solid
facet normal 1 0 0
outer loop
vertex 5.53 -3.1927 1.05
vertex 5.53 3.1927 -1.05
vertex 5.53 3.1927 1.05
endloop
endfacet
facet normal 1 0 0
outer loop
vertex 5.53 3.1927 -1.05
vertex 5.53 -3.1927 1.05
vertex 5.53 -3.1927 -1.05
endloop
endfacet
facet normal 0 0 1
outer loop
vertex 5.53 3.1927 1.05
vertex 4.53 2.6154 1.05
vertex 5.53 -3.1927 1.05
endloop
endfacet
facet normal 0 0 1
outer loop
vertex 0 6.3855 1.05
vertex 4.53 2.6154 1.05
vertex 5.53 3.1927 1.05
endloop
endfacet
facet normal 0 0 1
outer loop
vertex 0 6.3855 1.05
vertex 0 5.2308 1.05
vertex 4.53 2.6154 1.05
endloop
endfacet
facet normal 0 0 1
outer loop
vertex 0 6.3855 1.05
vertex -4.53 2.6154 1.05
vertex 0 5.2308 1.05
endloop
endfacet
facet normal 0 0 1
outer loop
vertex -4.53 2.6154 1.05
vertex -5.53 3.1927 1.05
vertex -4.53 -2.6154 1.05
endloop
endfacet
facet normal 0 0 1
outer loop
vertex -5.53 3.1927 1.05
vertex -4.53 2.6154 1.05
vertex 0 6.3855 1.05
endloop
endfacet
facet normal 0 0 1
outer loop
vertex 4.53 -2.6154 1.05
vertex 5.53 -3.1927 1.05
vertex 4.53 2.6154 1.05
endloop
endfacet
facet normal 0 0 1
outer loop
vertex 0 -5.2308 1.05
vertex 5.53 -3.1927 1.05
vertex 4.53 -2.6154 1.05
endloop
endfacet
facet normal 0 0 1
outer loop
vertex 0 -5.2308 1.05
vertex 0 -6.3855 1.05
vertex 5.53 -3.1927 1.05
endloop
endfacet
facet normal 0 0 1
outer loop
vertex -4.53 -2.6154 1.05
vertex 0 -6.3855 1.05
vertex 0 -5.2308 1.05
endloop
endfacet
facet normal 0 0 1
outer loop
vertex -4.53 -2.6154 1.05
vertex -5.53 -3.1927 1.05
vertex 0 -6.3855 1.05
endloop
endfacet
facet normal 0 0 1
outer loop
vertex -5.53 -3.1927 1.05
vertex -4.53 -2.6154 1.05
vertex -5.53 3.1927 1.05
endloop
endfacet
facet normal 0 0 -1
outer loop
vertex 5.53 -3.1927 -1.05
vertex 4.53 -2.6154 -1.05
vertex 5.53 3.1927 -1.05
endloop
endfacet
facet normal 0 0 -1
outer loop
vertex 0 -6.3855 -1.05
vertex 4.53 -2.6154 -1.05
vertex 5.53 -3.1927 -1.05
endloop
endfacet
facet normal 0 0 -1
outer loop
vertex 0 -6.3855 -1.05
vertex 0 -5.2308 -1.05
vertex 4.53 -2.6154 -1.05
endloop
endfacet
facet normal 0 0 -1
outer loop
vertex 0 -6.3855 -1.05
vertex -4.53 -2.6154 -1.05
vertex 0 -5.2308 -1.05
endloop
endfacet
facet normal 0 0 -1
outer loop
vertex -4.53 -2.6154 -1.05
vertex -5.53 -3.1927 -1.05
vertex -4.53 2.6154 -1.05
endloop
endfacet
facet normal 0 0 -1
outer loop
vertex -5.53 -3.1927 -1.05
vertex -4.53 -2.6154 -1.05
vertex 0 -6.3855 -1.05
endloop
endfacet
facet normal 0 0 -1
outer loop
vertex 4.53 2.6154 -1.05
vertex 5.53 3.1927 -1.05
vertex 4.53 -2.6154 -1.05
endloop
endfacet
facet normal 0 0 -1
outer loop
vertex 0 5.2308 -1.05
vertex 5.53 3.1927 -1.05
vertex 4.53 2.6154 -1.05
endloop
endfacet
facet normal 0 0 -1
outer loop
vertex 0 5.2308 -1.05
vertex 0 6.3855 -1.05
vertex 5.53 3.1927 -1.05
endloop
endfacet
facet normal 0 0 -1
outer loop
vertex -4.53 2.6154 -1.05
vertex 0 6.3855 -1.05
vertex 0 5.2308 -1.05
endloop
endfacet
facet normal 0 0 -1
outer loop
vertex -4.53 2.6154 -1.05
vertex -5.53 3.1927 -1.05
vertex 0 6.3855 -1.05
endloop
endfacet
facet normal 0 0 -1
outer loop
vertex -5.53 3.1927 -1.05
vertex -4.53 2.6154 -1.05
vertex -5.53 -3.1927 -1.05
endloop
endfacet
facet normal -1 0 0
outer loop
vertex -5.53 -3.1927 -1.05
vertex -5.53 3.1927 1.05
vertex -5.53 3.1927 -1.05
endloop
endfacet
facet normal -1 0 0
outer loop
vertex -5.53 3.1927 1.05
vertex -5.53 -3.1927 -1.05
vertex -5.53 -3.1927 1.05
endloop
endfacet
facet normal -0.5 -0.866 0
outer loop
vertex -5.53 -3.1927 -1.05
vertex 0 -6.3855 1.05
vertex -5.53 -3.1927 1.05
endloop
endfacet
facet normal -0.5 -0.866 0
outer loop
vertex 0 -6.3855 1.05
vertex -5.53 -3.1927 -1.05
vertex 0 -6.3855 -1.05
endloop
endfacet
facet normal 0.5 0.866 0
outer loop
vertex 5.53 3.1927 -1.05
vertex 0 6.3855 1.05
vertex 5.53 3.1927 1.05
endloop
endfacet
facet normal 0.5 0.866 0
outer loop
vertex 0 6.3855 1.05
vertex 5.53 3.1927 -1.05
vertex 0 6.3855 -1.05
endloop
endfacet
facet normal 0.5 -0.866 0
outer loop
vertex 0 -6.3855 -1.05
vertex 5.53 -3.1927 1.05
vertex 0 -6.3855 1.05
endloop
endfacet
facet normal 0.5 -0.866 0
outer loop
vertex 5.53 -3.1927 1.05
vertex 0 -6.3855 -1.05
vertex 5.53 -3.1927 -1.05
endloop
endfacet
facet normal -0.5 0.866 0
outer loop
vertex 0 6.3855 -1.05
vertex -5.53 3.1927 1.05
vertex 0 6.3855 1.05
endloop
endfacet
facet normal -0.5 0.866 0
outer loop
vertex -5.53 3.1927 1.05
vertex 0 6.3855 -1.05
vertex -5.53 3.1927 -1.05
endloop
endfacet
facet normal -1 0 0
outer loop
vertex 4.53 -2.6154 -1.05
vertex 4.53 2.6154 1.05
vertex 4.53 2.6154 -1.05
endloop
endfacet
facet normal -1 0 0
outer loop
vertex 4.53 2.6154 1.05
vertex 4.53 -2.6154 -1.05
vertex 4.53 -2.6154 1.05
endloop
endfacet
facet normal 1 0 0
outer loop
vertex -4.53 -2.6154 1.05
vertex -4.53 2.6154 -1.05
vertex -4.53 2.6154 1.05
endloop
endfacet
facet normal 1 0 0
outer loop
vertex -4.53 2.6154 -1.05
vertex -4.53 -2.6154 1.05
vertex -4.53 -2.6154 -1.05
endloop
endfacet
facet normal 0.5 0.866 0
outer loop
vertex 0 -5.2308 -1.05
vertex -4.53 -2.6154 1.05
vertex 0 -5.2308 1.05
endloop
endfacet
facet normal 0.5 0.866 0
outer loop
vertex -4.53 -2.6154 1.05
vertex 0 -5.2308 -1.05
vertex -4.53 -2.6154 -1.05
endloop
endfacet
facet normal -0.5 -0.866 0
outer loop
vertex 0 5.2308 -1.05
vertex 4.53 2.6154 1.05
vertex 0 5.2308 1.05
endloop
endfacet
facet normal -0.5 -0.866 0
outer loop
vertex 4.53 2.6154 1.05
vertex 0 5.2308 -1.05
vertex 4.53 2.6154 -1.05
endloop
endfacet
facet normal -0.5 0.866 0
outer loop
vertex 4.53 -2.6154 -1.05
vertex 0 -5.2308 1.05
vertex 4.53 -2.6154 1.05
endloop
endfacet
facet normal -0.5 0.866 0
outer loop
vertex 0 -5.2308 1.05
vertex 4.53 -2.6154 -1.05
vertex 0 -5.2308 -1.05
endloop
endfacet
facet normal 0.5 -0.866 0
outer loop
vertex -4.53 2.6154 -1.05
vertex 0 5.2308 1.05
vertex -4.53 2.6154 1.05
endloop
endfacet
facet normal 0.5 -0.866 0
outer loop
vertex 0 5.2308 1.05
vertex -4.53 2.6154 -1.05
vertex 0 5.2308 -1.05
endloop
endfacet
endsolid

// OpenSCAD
// file: ../../lib/bolt/metric_bolt.scad
include <bolt.scad>;

// https://www.fairburyfastener.com/xdims_metric_nuts.htm

//  hex_nut (height, thread_d, size, tolerance, quality, thread, pitch);
//hex_nut (1/8, 1/4, 3/8, 1/128, 32, 1, "imperial", 28);

/*
    hex_nut (height, thread_d, size, tolerance, quality, bool_cut, thread, pitch);
        height      =   height of the nut
        thread_d    =   threaded hole diameter width
        size        =   [ 0.00, 0.00, 0.00 ]hexagonal nut size
        tolerance   =   tolerance of entire measures (always positive, addition and subtraction already
                        calculated within the script
        quality     =   overall quality of the returned function (ref. $fn)
        bool_cut    =   do (1) or not (0) the nut cut
        *thread     =   string variable declaring measure type -> "metric" or "imperial"
        *pitch      =   stands for thread pitch      
*/

module m2_hex_nut() {
  hex_nut(1.6, 2, 4.32, 0.01, 32, 1, "metric", 0.4);
}

module m2_5_hex_nut() {
  hex_nut(2, 2.5, 5.45, 0.01, 32, 1, "metric", 0.45);
}

module m3_hex_nut() {
  hex_nut(2.3, 3, 6.01, 0.01, 32, 1, "metric", 0.5);
}

module m4_hex_nut() {
  hex_nut(3.2, 4, 7.66, 0.01, 32, 1, "metric", 0.7);
}

module m5_hex_nut() {
  hex_nut(4.7, 5, 8.79, 0.01, 32, 1, "metric", 0.8);
}

module m6_hex_nut() {
  hex_nut(5.2, 6, 11.05, 0.01, 32, 1, "metric", 1);
}

module m8_hex_nut() {
  hex_nut(6.8, 8, 14.38, 0.01, 32, 1, "metric", 1.25);
}

module m10_hex_nut() {
  hex_nut(8.4, 10, 17.77, 0.01, 32, 1, "metric", 1.5);
}

//  hex_bolt (lenght, thread_d, head_h, head_d, tolerance, quality, thread, pitch);

/*
    hex_bolt (lenght, thread_d, head_h, head_d, tolerance, quality, bool_cut, thread, pitch);
        lenght      =   threaded bar lenght
        thread_d    =   threaded bar diameter width
        head_h      =   hexagonal bolt head height
        head_d      =   hexagonal bolt head size
        tolerance   =   tolerance of entire measures (always positive, addition and subtraction already
                        calculated within the script
        quality     =   overall quality of the returned function (ref. $fn)
        bool_cut    =   do (1) or not (0) the nut cut
        *thread     =   string variable declaring measure type -> "metric" or "imperial"
        *pitch      =   stands for thread pitch
*/

module m2_hex_bolt(lenght=26,head_h=2) {
  translate([0, 0, -lenght])
    hex_bolt(lenght, 2, head_h, 4.32, 0.1, 32, 1, "metric", 0.4);
}

module m2_5_hex_bolt(lenght=26,head_h=2) {
  translate([0, 0, -lenght])
    hex_bolt(lenght, 2.5, head_h, 5.45, 0.1, 32, 1, "metric", 0.45);
}

module m3_hex_bolt(lenght=26,head_h=2) {
  translate([0, 0, -lenght])
    hex_bolt(lenght, 3, head_h, 6.01, 0.1, 32, 1, "metric", 0.5);
}

module m4_hex_bolt(lenght=26,head_h=2) {
  translate([0, 0, -lenght])
    hex_bolt(lenght, 4, head_h, 7.66, 0.1, 32, 1, "metric", 0.7);
}

module m5_hex_bolt(lenght=26,head_h=2) {
  translate([0, 0, -lenght])
    hex_bolt(lenght, 5, head_h, 8.79, 0.1, 32, 1, "metric", 0.8);
}

module m6_hex_bolt(lenght=26,head_h=2) {
  translate([0, 0, -lenght])
    hex_bolt(lenght, 6, head_h, 11.05, 0.1, 32, 1, "metric", 1);
}

module m8_hex_bolt(lenght=26,head_h=6.8) {
  translate([0, 0, -lenght])
    hex_bolt(lenght, 8, head_h, 14.38, 0.1, 32, 1, "metric", 1.25);
}

module m10_hex_bolt(lenght=26,head_h=8.4) {
  translate([0, 0, -lenght])
    hex_bolt(lenght, 10, head_h, 17.77, 0.1, 32, 1, "metric", 1.5);
}

//m8_hex_bolt_extrude(20, 1, 0.1);

module m1_6_hex_bolt_extrude(depth, head, clear) {
  translate([0,0,-depth/2]) hex_bolt_extrude(depth, head, 1.6, 3.41, clear);
}

module m2_hex_bolt_extrude(depth, head, clear) {
  translate([0,0,-depth/2]) hex_bolt_extrude(depth, head, 2, 4.32, clear);
}

module m2_5_hex_bolt_extrude(depth, head, clear) {
  translate([0,0,-depth/2]) hex_bolt_extrude(depth, head, 2.5, 5.45, clear);
}

module m3_hex_bolt_extrude(depth, head, clear) {
  translate([0,0,-depth/2]) hex_bolt_extrude(depth, head, 3, 6.01, clear);
}

module m4_hex_bolt_extrude(depth, head, clear) {
  translate([0,0,-depth/2]) hex_bolt_extrude(depth, head, 4, 7.66, clear);
}

module m5_hex_bolt_extrude(depth, head, clear) {
  translate([0,0,-depth/2]) hex_bolt_extrude(depth, head, 5, 8.79, clear);
}

module m6_hex_bolt_extrude(depth, head, clear) {
  translate([0,0,-depth/2]) hex_bolt_extrude(depth, head, 6, 11.05, clear);
}

module m8_hex_bolt_extrude(depth, head, clear) {
  translate([0,0,-depth/2]) hex_bolt_extrude(depth, head, 8, 14.38, clear);
}

module m10_hex_bolt_extrude(depth, head, clear) {
  translate([0,0,-depth/2]) hex_bolt_extrude(depth, head, 10, 17.77, clear);
}

module hex_bolt_extrude(depth, head_h, body, head, clear) {
  translate([0,0,head_h/2]) rotate([0, 0, 90]) hex_head_extrude(head_h, head, clear);
  translate([0,0,head_h]) bolt_body_extrude(depth-head_h+clear, body, clear);
}

module bolt_body_extrude(height, diameter, clear) {
    radius = diameter/2+clear*2;
    cylinder(h=height, r1=radius, r2=radius, center=false, $fn=50);
}

module hex_head_extrude(height, diameter, clear) {
    height = height+clear;
	radius = diameter+1+clear*4;
    angle = 360/6;
	cote = (radius)/tan(angle);

	union() {
		rotate([0,0,0])
			cube([radius,cote,height],center=true);
		rotate([0,0,angle])
			cube([radius,cote,height],center=true);
		rotate([0,0,2*angle])
			cube([radius,cote,height],center=true);
	}
}
// file: ../../lib/joint/joint_hex_spacer.scad
include <../bolt/metric_bolt.scad>;

//m2_hex_spacer(2, 2, 0.1);

module m1_6_hex_spacer(height, width, clear) {
    difference() {
        diameter = 3.41;
        hex_head_extrude(height, diameter+width, clear);
        translate([0,0,0]) hex_head_extrude(height+2*clear, diameter, clear);
    }
}


module m2_hex_spacer(height, width, clear) {
    difference() {
        diameter = 4.32;
        hex_head_extrude(height, diameter+width, clear);
        translate([0,0,0]) hex_head_extrude(height+2*clear, diameter, clear);
    }
}

module m2_5_hex_spacer(height, width, clear) {
    difference() {
        diameter = 5.45;
        hex_head_extrude(height, diameter+width, clear);
        translate([0,0,0]) hex_head_extrude(height+2*clear, diameter, clear);
    }
}

module m3_hex_spacer(height, width, clear) {
    difference() {
        diameter = 6.01;
        hex_head_extrude(height, diameter+width, clear);
        translate([0,0,0]) hex_head_extrude(height+2*clear, diameter, clear);
    }
}

module m4_hex_spacer(height, width, clear) {
    difference() {
        diameter = 7.66;
        hex_head_extrude(height, diameter+width, clear);
        translate([0,0,0]) hex_head_extrude(height+2*clear, diameter, clear);
    }
}

module m5_hex_spacer(height, width, clear) {
    difference() {
        diameter = 8.79;
        hex_head_extrude(height, diameter+width, clear);
        translate([0,0,0]) hex_head_extrude(height+2*clear, diameter, clear);
    }
}

module m6_hex_spacer(height, width, clear) {
    difference() {
        diameter = 11.05;
        hex_head_extrude(height, diameter+width, clear);
        translate([0,0,0]) hex_head_extrude(height+2*clear, diameter, clear);
    }
}

module m8_hex_spacer(height, width, clear) {
    difference() {
        diameter = 14.38;
        hex_head_extrude(height, diameter+width, clear);
        translate([0,0,0]) hex_head_extrude(height+2*clear, diameter, clear);
    }
}

module m10_hex_spacer(height, width, clear) {
    difference() {
        diameter = 17.77;
        hex_head_extrude(height, diameter+width, clear);
        translate([0,0,0]) hex_head_extrude(height+2*clear, diameter, clear);
    }
}
// file: ../../lib/material.scad
module gray() {
	color([.4, .4, .4]) children([0:$children-1]);
}

module black() {
	color([.3, .3, .3]) children([0:$children-1]);
}

module orange() {
	color([1, .7, 0]) children([0:$children-1]);
}

module yellow() {
	color([.7, .7, .3]) children([0:$children-1]);
}

module green_pcb() {
	color([.0, .5, .25]) children([0:$children-1]);
}

module metal() {
	color([.7, .7, .7]) children([0:$children-1]);
}

module gold() {
	color([.8, .5, .0]) children([0:$children-1]);
}

module stainless(no="1.4301") {
	color([0.45, 0.43, 0.5]) children([0:$children-1]);
}

module steel(no) {
	color([0.65, 0.67, 0.72]) children([0:$children-1]);
}

module iron(no="ST37") {
	color([0.36, 0.33, 0.33]) children([0:$children-1]);
}

module plastic() {
	color([1, .7, 0]) children([0:$children-1]);
}
// main file
include <../../lib/material.scad>;
include <../../lib/joint/joint_hex_spacer.scad>;

plastic() {
  m4_hex_spacer(2, 2, 0.1);
}
